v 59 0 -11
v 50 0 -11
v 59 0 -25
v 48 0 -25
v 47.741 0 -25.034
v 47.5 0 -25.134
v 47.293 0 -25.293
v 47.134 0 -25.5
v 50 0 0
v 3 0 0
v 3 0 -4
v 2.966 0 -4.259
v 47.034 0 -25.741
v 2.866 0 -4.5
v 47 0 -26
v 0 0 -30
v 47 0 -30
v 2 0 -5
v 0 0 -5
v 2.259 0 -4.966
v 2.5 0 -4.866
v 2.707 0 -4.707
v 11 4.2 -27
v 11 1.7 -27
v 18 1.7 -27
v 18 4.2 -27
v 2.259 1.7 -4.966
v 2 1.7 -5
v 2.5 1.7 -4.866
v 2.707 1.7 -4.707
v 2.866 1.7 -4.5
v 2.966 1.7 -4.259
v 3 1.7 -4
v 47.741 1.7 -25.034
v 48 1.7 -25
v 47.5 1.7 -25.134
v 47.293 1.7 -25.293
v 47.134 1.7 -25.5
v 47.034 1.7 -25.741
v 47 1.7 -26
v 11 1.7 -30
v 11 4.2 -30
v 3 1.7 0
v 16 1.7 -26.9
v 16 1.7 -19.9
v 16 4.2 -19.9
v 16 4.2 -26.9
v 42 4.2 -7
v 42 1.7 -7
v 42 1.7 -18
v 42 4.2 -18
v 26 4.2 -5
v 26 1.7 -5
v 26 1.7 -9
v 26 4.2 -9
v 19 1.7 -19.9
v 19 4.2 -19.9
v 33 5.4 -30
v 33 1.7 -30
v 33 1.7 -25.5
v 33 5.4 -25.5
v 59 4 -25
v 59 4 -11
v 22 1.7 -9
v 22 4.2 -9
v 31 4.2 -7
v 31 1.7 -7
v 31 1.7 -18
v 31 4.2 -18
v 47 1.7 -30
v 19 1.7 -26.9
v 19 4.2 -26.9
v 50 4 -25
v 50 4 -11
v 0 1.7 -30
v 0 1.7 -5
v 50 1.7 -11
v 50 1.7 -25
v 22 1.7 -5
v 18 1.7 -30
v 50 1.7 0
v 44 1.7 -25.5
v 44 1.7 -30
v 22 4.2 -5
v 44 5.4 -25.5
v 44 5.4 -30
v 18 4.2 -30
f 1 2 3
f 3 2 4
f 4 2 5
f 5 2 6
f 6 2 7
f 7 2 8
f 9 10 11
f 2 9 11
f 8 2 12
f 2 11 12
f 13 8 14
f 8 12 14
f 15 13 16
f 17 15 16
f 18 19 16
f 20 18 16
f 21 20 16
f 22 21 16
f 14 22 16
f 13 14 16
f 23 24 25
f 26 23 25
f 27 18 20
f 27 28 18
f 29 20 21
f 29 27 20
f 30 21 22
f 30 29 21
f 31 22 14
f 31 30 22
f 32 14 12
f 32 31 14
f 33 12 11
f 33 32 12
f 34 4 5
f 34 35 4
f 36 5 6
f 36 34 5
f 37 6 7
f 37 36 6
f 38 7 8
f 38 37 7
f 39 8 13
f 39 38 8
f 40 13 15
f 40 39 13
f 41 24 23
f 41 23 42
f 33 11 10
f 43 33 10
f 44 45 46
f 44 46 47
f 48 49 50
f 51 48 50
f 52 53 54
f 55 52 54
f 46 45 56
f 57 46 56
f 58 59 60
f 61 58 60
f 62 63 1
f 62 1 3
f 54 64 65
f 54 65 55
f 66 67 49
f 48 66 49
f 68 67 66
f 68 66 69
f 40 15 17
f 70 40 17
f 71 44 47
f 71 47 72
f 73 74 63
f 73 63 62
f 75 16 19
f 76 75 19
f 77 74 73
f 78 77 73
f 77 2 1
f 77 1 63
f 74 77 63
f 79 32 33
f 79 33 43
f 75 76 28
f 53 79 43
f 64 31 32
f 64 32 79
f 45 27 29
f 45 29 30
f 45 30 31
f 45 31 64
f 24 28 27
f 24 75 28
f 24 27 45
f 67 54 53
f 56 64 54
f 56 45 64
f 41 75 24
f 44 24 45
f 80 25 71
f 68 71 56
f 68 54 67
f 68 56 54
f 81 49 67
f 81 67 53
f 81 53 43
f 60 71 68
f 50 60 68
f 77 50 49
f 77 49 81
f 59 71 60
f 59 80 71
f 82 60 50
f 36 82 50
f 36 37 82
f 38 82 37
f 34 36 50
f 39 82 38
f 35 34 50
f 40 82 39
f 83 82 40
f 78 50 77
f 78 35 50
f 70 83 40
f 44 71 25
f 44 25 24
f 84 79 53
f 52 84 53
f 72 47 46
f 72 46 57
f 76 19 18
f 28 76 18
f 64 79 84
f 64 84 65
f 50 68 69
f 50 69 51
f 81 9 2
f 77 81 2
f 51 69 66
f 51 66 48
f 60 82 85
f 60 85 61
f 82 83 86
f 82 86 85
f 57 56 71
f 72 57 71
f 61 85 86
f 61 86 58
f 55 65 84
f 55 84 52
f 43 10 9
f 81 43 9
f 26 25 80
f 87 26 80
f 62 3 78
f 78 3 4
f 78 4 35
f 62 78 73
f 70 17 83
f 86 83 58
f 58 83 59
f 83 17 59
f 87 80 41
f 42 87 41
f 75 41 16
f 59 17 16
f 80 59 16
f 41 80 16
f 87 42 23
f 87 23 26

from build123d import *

# Parameters (mm, degrees)
BOSS_EXTRUDE2_DEPTH = 1.7
FILLET2_R           = 1
SKETCH2_W           = 7
SKETCH2_H           = 3
SKETCH2_W_2         = 3
SKETCH2_H_2         = 7
SKETCH2_W_3         = 4
SKETCH2_H_3         = 4
SKETCH2_W_4         = 11
SKETCH2_H_4         = 11
BOSS_EXTRUDE3_DEPTH = 2.5
SKETCH3_W           = 11
SKETCH3_H           = 4.5
BOSS_EXTRUDE4_DEPTH = 3.7
SKETCH4_W           = 14
SKETCH4_H           = 4
BOSS_EXTRUDE5_DEPTH = 9


with BuildPart() as part:
    # Sketch1 → Boss-Extrude2 (new body)
    with BuildSketch(Plane(origin=(0, 0, 0), x_dir=(1, 0, 0), z_dir=(0, 1, 0))):
        Polygon((0, 5), (3, 5), (3, 0), (50, 0), (50, 25), (47, 25), (47, 30), (0, 30), align=None)
    extrude(amount=BOSS_EXTRUDE2_DEPTH)

    # Fillet2
    fillet2_edges = [part.edges().sort_by_distance(p)[0] for p in [
        (47, 0.85, -25),
        (3, 0.85, -5),
    ]]
    fillet(fillet2_edges, radius=FILLET2_R)

    # Sketch2 → Boss-Extrude3 (add)
    with BuildSketch(Plane(origin=(0, 1.7, 0), x_dir=(1, 0, 0), z_dir=(0, 1, 0))):
        with Locations((14.5, 28.5)):
            Rectangle(SKETCH2_W, SKETCH2_H)
        with Locations((17.5, 23.4)):
            Rectangle(SKETCH2_W_2, SKETCH2_H_2)
        with Locations((24, 7)):
            Rectangle(SKETCH2_W_3, SKETCH2_H_3)
        with Locations((36.5, 12.5)):
            Rectangle(SKETCH2_W_4, SKETCH2_H_4)
    extrude(amount=BOSS_EXTRUDE3_DEPTH)

    # Sketch3 → Boss-Extrude4 (add)
    with BuildSketch(Plane(origin=(0, 1.7, -31.7), x_dir=(-1, 0, 0), z_dir=(0, 1, 0))):
        with Locations((-38.5, 3.95)):
            Rectangle(SKETCH3_W, SKETCH3_H)
    extrude(amount=BOSS_EXTRUDE4_DEPTH)

    # Sketch4 → Boss-Extrude5 (add)
    with BuildSketch(Plane(origin=(50, 0, 0), x_dir=(0, 0, -1), z_dir=(1, 0, 0))):
        with Locations((18, 2)):
            Rectangle(SKETCH4_W, SKETCH4_H)
    extrude(amount=BOSS_EXTRUDE5_DEPTH)


solid = part.part
